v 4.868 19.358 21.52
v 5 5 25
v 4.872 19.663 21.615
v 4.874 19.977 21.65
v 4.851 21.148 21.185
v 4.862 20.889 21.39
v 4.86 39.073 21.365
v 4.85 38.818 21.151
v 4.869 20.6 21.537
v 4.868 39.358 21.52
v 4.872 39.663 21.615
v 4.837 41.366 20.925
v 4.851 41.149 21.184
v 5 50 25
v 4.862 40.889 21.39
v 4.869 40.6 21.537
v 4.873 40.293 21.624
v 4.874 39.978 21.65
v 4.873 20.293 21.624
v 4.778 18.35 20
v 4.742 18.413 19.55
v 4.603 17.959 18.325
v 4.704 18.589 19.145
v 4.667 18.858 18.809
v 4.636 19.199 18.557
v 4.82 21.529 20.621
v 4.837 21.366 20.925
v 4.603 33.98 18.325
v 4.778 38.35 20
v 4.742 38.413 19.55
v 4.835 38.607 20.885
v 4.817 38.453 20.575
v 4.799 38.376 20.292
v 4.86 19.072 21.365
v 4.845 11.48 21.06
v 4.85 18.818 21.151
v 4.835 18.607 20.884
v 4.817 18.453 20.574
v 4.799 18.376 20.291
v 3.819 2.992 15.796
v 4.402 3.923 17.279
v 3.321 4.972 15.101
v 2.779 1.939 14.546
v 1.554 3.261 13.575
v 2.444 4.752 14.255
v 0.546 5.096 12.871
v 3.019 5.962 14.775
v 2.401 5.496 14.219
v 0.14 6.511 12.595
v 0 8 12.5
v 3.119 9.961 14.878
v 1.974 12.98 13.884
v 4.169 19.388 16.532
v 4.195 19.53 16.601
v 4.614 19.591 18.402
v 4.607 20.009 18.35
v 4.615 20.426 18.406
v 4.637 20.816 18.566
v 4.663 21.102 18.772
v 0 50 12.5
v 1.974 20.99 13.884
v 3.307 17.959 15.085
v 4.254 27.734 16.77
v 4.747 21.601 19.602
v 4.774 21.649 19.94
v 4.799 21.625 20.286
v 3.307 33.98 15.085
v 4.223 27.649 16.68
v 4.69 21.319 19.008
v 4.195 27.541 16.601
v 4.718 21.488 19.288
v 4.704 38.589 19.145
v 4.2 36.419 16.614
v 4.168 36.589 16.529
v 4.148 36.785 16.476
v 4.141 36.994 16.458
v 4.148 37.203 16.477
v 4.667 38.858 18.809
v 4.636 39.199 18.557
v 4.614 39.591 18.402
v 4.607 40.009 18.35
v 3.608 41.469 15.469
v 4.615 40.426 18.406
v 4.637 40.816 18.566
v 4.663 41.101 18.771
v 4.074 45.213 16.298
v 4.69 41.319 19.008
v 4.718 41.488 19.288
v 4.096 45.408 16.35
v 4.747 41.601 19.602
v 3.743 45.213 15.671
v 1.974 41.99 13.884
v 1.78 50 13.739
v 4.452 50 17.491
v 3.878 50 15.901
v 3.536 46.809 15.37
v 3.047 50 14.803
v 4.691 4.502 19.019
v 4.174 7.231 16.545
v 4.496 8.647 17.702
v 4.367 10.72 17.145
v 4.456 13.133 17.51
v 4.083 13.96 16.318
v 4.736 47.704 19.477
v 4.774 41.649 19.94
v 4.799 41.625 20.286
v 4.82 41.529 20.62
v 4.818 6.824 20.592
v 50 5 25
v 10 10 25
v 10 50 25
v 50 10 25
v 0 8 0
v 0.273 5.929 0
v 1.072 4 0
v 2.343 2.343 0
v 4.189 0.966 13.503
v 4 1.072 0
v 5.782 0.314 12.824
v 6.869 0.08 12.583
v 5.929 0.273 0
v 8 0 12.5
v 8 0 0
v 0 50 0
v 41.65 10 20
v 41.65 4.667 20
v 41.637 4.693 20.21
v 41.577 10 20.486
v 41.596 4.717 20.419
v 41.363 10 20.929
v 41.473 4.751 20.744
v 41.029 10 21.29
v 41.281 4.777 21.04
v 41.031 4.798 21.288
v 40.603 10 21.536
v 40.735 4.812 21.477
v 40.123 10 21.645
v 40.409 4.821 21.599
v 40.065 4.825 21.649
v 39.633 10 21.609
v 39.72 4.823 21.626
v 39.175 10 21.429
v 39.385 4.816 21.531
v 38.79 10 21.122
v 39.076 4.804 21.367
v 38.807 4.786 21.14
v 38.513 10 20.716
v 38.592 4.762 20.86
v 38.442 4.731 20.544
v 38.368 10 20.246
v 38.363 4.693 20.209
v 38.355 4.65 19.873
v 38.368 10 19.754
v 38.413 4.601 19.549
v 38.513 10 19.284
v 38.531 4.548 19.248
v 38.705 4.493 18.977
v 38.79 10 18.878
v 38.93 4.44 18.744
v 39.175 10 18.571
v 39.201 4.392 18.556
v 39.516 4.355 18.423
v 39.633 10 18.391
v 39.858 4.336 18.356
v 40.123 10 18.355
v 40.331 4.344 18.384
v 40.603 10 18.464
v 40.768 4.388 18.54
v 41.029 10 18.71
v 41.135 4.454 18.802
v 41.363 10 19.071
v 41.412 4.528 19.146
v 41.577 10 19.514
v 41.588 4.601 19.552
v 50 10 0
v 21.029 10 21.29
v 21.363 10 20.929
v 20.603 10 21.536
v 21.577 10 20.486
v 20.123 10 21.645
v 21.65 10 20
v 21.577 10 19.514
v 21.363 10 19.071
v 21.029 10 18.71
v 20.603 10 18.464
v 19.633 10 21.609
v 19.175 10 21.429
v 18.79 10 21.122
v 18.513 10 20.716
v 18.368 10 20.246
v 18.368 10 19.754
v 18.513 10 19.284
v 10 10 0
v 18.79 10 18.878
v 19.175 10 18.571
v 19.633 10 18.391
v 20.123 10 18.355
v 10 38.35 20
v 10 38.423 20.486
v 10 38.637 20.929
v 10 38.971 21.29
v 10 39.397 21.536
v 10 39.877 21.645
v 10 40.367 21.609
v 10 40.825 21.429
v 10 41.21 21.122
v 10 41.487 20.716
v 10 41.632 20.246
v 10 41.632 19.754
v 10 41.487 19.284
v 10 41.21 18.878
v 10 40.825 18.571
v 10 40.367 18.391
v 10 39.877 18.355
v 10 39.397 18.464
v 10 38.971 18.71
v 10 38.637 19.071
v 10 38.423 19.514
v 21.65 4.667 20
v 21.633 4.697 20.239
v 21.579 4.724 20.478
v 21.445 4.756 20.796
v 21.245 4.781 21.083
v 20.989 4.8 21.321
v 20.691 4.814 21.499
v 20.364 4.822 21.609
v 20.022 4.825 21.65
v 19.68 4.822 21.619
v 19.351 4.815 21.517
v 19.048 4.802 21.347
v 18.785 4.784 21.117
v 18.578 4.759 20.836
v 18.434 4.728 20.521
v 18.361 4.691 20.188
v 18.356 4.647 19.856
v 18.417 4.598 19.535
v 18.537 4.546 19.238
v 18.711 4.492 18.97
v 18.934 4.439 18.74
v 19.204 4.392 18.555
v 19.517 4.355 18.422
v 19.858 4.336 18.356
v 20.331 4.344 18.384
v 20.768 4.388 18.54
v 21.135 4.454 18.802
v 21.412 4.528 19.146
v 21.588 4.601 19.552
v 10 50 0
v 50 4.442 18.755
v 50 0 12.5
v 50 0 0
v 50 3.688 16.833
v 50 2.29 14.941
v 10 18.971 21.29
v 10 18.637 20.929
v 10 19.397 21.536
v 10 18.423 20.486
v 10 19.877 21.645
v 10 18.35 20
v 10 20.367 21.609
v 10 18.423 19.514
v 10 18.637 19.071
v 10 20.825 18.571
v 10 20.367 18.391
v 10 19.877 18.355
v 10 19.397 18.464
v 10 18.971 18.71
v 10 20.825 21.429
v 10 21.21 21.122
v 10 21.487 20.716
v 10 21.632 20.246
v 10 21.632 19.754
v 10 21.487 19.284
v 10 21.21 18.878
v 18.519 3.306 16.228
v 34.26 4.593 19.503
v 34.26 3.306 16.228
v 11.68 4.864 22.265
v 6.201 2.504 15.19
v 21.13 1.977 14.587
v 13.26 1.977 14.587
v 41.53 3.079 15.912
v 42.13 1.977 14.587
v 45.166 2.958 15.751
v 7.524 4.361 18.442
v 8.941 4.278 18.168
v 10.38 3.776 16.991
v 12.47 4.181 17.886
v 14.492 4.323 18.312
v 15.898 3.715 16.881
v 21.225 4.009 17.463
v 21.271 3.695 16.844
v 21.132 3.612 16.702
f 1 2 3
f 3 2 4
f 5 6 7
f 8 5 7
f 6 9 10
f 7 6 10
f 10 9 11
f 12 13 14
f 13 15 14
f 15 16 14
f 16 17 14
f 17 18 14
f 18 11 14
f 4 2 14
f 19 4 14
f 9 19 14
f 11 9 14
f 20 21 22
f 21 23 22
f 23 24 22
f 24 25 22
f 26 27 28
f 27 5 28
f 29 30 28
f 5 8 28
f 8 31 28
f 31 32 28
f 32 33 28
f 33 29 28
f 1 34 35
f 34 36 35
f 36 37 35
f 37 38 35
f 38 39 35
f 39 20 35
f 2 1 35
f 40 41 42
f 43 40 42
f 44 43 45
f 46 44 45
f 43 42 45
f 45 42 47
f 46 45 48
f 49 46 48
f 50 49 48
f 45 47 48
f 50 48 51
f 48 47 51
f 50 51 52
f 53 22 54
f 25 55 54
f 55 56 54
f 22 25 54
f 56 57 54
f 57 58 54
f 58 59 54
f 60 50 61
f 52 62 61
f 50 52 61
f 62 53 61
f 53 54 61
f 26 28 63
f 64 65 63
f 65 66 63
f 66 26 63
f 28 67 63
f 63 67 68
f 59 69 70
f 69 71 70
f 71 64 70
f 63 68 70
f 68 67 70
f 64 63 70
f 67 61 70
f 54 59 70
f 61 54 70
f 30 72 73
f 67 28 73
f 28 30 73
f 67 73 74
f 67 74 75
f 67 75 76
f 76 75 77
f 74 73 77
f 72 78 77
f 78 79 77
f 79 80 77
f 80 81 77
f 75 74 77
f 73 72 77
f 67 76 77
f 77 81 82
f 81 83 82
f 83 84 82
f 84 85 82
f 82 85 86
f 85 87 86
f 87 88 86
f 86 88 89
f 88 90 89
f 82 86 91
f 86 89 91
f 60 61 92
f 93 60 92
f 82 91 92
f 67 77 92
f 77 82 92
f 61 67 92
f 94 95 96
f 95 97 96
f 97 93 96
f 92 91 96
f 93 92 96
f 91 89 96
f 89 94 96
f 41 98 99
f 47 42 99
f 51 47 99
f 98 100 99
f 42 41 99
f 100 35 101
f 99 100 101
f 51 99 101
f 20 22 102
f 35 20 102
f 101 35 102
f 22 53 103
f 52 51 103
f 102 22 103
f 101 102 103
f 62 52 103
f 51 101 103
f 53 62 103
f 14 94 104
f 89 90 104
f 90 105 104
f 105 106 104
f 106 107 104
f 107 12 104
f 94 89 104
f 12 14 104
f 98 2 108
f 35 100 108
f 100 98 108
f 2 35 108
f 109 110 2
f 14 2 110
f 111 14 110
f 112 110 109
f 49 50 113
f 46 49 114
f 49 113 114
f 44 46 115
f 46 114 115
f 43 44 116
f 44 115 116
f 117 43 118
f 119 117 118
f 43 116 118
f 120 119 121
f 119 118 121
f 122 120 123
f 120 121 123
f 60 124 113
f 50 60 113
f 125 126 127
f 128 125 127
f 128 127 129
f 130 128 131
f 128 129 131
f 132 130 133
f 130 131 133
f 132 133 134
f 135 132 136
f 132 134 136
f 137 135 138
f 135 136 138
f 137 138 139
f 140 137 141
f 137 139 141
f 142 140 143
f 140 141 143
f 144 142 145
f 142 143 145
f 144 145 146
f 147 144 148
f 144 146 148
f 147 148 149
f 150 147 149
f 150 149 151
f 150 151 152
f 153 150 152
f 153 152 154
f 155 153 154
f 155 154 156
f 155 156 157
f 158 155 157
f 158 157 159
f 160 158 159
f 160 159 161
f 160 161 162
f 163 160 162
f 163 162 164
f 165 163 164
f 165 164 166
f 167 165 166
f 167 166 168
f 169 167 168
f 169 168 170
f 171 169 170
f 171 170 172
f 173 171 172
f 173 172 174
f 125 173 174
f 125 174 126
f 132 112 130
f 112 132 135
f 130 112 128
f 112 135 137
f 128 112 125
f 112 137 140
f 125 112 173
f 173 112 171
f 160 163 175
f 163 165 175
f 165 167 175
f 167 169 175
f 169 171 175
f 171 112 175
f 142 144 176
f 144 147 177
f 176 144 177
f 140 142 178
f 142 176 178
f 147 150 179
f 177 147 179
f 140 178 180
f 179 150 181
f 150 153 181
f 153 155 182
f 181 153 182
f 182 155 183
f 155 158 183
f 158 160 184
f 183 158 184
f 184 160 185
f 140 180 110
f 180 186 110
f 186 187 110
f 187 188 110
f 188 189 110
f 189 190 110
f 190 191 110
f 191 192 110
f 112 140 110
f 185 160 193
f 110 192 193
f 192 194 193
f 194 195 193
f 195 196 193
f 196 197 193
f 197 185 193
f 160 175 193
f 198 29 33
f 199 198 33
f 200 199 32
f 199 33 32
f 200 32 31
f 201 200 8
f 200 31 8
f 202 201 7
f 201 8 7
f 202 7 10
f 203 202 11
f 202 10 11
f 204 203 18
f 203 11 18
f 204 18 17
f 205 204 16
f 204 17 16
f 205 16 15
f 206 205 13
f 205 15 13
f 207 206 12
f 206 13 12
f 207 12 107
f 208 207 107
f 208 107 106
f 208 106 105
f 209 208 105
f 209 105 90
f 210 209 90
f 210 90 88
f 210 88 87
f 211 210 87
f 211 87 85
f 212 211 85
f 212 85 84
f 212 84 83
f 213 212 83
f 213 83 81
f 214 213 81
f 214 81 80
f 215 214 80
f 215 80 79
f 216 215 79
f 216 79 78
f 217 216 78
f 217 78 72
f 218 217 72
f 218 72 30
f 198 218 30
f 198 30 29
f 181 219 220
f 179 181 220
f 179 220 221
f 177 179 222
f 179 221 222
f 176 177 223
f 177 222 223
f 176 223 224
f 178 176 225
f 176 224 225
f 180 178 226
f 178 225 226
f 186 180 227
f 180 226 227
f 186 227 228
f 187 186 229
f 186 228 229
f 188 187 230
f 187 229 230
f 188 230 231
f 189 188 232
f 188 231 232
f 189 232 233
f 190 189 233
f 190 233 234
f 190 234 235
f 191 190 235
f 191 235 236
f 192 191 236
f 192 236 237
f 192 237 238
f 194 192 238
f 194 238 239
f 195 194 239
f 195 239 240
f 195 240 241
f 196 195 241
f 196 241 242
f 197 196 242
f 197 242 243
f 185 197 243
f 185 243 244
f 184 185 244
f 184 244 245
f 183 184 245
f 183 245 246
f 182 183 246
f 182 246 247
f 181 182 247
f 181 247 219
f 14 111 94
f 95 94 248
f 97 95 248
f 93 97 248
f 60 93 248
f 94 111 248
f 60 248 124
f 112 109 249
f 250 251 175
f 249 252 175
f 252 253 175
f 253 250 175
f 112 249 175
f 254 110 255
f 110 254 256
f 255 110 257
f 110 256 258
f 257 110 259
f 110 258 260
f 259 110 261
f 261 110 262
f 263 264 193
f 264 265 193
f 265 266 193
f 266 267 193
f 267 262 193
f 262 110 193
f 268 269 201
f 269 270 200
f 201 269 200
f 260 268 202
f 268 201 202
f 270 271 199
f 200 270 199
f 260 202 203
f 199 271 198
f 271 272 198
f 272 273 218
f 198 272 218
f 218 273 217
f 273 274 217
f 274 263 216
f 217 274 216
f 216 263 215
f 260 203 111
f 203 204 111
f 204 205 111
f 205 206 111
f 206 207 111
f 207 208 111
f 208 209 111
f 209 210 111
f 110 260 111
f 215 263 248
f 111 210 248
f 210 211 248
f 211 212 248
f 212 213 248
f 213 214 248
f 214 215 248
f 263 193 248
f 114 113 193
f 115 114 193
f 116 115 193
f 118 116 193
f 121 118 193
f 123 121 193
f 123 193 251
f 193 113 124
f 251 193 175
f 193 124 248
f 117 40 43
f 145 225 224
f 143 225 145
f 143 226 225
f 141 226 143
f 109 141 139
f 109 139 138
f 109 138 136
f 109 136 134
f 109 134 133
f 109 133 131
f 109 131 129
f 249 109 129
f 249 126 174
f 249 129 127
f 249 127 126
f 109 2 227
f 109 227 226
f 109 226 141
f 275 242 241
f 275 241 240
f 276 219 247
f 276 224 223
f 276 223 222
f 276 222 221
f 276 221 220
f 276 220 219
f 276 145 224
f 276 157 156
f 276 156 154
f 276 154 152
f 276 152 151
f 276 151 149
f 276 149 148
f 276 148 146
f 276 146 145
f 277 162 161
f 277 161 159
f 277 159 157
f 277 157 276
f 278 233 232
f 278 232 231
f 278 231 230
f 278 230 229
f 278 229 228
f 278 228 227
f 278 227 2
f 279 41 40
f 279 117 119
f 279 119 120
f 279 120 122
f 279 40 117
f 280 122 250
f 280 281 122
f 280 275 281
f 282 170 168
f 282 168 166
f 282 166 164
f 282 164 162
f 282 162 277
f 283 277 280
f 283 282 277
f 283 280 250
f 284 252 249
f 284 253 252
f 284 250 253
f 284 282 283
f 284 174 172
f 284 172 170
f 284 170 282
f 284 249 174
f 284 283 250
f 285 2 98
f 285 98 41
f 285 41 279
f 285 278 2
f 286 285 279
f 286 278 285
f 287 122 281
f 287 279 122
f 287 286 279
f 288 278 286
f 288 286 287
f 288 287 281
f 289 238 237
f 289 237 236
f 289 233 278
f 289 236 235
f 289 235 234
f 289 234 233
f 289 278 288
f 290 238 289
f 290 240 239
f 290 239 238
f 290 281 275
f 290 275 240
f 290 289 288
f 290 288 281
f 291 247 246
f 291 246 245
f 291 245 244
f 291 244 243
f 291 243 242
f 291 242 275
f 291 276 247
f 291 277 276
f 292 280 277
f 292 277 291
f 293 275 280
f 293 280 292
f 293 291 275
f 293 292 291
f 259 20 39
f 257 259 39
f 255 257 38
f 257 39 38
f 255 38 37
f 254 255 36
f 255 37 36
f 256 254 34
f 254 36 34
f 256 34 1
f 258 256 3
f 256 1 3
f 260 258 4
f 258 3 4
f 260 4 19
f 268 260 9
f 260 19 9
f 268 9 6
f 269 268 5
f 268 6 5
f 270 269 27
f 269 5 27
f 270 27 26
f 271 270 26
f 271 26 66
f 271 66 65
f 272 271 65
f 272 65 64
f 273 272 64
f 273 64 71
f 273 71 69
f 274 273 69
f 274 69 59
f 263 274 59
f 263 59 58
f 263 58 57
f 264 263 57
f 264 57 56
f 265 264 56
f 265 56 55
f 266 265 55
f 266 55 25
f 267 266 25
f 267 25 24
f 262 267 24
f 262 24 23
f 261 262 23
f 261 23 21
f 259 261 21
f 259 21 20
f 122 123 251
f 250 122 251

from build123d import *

# Parameters (mm, degrees)
F1_DEPTH = 25
F3_DEPTH = 50.001
F5_DEPTH = 50.0010001
F7_D     = 3.3
F9_D     = 3.3


with BuildPart() as f1:
    # F0 (on Top) → F1 (new body)
    with BuildSketch(Plane.XY):
        with BuildLine():
            Line((0, 50), (0, 8))
            ThreePointArc((0, 8), (2.3431457505, 2.3431457505), (8, 0))
            Line((8, 0), (50, 0))
            Line((50, 0), (50, 10))
            Line((50, 10), (10, 10))
            Line((10, 10), (10, 50))
            Line((10, 50), (0, 50))
        make_face()
    extrude(amount=F1_DEPTH)

    # F2 (on face) → F3 (cut, through all)
    with BuildSketch(Plane.YZ.offset(50)):
        with BuildLine():
            add(Edge.make_bspline(
                [(5, 25), (4.6534377741, 17.5), (4.6950438991, 17.3452608287), (0, 12.5)],
                knots=[0, 0, 0, 0, 13.4629120178, 13.4629120178, 13.4629120178, 13.4629120178], degree=3))
            Line((5, 25), (0, 25))
            Line((0, 25), (0, 12.5))
        make_face()
    extrude(amount=-F3_DEPTH, mode=Mode.SUBTRACT)

    # F4 (on face) → F5 (cut, through all)
    with BuildSketch(Plane(origin=(0, 50, 0), x_dir=(-1, 0, 0), z_dir=(0, 1, 0))):
        with BuildLine():
            Line((0, 25), (-5, 25))
            add(Edge.make_bspline(
                [(-5, 25), (-4.6829669736, 15.6825594604), (-4.6829669736, 15.6825594604), (0, 12.5)],
                knots=[0, 0, 0, 0, 13.4629120178, 13.4629120178, 13.4629120178, 13.4629120178], degree=3))
            Line((0, 12.5), (0, 25))
        make_face()
    extrude(amount=-F5_DEPTH, mode=Mode.SUBTRACT)

    # F7 (through all)
    with Locations(Plane(origin=(0, 10, 0), x_dir=(-1, 0, 0), z_dir=(0, 1, 0))):
        with Locations((-40, 20), (-20, 20)):
            Hole(F7_D / 2)

    # F9 (through all)
    with Locations(Plane.YZ.offset(10)):
        with Locations((20, 20), (40, 20)):
            Hole(F9_D / 2)


solid = f1.part
